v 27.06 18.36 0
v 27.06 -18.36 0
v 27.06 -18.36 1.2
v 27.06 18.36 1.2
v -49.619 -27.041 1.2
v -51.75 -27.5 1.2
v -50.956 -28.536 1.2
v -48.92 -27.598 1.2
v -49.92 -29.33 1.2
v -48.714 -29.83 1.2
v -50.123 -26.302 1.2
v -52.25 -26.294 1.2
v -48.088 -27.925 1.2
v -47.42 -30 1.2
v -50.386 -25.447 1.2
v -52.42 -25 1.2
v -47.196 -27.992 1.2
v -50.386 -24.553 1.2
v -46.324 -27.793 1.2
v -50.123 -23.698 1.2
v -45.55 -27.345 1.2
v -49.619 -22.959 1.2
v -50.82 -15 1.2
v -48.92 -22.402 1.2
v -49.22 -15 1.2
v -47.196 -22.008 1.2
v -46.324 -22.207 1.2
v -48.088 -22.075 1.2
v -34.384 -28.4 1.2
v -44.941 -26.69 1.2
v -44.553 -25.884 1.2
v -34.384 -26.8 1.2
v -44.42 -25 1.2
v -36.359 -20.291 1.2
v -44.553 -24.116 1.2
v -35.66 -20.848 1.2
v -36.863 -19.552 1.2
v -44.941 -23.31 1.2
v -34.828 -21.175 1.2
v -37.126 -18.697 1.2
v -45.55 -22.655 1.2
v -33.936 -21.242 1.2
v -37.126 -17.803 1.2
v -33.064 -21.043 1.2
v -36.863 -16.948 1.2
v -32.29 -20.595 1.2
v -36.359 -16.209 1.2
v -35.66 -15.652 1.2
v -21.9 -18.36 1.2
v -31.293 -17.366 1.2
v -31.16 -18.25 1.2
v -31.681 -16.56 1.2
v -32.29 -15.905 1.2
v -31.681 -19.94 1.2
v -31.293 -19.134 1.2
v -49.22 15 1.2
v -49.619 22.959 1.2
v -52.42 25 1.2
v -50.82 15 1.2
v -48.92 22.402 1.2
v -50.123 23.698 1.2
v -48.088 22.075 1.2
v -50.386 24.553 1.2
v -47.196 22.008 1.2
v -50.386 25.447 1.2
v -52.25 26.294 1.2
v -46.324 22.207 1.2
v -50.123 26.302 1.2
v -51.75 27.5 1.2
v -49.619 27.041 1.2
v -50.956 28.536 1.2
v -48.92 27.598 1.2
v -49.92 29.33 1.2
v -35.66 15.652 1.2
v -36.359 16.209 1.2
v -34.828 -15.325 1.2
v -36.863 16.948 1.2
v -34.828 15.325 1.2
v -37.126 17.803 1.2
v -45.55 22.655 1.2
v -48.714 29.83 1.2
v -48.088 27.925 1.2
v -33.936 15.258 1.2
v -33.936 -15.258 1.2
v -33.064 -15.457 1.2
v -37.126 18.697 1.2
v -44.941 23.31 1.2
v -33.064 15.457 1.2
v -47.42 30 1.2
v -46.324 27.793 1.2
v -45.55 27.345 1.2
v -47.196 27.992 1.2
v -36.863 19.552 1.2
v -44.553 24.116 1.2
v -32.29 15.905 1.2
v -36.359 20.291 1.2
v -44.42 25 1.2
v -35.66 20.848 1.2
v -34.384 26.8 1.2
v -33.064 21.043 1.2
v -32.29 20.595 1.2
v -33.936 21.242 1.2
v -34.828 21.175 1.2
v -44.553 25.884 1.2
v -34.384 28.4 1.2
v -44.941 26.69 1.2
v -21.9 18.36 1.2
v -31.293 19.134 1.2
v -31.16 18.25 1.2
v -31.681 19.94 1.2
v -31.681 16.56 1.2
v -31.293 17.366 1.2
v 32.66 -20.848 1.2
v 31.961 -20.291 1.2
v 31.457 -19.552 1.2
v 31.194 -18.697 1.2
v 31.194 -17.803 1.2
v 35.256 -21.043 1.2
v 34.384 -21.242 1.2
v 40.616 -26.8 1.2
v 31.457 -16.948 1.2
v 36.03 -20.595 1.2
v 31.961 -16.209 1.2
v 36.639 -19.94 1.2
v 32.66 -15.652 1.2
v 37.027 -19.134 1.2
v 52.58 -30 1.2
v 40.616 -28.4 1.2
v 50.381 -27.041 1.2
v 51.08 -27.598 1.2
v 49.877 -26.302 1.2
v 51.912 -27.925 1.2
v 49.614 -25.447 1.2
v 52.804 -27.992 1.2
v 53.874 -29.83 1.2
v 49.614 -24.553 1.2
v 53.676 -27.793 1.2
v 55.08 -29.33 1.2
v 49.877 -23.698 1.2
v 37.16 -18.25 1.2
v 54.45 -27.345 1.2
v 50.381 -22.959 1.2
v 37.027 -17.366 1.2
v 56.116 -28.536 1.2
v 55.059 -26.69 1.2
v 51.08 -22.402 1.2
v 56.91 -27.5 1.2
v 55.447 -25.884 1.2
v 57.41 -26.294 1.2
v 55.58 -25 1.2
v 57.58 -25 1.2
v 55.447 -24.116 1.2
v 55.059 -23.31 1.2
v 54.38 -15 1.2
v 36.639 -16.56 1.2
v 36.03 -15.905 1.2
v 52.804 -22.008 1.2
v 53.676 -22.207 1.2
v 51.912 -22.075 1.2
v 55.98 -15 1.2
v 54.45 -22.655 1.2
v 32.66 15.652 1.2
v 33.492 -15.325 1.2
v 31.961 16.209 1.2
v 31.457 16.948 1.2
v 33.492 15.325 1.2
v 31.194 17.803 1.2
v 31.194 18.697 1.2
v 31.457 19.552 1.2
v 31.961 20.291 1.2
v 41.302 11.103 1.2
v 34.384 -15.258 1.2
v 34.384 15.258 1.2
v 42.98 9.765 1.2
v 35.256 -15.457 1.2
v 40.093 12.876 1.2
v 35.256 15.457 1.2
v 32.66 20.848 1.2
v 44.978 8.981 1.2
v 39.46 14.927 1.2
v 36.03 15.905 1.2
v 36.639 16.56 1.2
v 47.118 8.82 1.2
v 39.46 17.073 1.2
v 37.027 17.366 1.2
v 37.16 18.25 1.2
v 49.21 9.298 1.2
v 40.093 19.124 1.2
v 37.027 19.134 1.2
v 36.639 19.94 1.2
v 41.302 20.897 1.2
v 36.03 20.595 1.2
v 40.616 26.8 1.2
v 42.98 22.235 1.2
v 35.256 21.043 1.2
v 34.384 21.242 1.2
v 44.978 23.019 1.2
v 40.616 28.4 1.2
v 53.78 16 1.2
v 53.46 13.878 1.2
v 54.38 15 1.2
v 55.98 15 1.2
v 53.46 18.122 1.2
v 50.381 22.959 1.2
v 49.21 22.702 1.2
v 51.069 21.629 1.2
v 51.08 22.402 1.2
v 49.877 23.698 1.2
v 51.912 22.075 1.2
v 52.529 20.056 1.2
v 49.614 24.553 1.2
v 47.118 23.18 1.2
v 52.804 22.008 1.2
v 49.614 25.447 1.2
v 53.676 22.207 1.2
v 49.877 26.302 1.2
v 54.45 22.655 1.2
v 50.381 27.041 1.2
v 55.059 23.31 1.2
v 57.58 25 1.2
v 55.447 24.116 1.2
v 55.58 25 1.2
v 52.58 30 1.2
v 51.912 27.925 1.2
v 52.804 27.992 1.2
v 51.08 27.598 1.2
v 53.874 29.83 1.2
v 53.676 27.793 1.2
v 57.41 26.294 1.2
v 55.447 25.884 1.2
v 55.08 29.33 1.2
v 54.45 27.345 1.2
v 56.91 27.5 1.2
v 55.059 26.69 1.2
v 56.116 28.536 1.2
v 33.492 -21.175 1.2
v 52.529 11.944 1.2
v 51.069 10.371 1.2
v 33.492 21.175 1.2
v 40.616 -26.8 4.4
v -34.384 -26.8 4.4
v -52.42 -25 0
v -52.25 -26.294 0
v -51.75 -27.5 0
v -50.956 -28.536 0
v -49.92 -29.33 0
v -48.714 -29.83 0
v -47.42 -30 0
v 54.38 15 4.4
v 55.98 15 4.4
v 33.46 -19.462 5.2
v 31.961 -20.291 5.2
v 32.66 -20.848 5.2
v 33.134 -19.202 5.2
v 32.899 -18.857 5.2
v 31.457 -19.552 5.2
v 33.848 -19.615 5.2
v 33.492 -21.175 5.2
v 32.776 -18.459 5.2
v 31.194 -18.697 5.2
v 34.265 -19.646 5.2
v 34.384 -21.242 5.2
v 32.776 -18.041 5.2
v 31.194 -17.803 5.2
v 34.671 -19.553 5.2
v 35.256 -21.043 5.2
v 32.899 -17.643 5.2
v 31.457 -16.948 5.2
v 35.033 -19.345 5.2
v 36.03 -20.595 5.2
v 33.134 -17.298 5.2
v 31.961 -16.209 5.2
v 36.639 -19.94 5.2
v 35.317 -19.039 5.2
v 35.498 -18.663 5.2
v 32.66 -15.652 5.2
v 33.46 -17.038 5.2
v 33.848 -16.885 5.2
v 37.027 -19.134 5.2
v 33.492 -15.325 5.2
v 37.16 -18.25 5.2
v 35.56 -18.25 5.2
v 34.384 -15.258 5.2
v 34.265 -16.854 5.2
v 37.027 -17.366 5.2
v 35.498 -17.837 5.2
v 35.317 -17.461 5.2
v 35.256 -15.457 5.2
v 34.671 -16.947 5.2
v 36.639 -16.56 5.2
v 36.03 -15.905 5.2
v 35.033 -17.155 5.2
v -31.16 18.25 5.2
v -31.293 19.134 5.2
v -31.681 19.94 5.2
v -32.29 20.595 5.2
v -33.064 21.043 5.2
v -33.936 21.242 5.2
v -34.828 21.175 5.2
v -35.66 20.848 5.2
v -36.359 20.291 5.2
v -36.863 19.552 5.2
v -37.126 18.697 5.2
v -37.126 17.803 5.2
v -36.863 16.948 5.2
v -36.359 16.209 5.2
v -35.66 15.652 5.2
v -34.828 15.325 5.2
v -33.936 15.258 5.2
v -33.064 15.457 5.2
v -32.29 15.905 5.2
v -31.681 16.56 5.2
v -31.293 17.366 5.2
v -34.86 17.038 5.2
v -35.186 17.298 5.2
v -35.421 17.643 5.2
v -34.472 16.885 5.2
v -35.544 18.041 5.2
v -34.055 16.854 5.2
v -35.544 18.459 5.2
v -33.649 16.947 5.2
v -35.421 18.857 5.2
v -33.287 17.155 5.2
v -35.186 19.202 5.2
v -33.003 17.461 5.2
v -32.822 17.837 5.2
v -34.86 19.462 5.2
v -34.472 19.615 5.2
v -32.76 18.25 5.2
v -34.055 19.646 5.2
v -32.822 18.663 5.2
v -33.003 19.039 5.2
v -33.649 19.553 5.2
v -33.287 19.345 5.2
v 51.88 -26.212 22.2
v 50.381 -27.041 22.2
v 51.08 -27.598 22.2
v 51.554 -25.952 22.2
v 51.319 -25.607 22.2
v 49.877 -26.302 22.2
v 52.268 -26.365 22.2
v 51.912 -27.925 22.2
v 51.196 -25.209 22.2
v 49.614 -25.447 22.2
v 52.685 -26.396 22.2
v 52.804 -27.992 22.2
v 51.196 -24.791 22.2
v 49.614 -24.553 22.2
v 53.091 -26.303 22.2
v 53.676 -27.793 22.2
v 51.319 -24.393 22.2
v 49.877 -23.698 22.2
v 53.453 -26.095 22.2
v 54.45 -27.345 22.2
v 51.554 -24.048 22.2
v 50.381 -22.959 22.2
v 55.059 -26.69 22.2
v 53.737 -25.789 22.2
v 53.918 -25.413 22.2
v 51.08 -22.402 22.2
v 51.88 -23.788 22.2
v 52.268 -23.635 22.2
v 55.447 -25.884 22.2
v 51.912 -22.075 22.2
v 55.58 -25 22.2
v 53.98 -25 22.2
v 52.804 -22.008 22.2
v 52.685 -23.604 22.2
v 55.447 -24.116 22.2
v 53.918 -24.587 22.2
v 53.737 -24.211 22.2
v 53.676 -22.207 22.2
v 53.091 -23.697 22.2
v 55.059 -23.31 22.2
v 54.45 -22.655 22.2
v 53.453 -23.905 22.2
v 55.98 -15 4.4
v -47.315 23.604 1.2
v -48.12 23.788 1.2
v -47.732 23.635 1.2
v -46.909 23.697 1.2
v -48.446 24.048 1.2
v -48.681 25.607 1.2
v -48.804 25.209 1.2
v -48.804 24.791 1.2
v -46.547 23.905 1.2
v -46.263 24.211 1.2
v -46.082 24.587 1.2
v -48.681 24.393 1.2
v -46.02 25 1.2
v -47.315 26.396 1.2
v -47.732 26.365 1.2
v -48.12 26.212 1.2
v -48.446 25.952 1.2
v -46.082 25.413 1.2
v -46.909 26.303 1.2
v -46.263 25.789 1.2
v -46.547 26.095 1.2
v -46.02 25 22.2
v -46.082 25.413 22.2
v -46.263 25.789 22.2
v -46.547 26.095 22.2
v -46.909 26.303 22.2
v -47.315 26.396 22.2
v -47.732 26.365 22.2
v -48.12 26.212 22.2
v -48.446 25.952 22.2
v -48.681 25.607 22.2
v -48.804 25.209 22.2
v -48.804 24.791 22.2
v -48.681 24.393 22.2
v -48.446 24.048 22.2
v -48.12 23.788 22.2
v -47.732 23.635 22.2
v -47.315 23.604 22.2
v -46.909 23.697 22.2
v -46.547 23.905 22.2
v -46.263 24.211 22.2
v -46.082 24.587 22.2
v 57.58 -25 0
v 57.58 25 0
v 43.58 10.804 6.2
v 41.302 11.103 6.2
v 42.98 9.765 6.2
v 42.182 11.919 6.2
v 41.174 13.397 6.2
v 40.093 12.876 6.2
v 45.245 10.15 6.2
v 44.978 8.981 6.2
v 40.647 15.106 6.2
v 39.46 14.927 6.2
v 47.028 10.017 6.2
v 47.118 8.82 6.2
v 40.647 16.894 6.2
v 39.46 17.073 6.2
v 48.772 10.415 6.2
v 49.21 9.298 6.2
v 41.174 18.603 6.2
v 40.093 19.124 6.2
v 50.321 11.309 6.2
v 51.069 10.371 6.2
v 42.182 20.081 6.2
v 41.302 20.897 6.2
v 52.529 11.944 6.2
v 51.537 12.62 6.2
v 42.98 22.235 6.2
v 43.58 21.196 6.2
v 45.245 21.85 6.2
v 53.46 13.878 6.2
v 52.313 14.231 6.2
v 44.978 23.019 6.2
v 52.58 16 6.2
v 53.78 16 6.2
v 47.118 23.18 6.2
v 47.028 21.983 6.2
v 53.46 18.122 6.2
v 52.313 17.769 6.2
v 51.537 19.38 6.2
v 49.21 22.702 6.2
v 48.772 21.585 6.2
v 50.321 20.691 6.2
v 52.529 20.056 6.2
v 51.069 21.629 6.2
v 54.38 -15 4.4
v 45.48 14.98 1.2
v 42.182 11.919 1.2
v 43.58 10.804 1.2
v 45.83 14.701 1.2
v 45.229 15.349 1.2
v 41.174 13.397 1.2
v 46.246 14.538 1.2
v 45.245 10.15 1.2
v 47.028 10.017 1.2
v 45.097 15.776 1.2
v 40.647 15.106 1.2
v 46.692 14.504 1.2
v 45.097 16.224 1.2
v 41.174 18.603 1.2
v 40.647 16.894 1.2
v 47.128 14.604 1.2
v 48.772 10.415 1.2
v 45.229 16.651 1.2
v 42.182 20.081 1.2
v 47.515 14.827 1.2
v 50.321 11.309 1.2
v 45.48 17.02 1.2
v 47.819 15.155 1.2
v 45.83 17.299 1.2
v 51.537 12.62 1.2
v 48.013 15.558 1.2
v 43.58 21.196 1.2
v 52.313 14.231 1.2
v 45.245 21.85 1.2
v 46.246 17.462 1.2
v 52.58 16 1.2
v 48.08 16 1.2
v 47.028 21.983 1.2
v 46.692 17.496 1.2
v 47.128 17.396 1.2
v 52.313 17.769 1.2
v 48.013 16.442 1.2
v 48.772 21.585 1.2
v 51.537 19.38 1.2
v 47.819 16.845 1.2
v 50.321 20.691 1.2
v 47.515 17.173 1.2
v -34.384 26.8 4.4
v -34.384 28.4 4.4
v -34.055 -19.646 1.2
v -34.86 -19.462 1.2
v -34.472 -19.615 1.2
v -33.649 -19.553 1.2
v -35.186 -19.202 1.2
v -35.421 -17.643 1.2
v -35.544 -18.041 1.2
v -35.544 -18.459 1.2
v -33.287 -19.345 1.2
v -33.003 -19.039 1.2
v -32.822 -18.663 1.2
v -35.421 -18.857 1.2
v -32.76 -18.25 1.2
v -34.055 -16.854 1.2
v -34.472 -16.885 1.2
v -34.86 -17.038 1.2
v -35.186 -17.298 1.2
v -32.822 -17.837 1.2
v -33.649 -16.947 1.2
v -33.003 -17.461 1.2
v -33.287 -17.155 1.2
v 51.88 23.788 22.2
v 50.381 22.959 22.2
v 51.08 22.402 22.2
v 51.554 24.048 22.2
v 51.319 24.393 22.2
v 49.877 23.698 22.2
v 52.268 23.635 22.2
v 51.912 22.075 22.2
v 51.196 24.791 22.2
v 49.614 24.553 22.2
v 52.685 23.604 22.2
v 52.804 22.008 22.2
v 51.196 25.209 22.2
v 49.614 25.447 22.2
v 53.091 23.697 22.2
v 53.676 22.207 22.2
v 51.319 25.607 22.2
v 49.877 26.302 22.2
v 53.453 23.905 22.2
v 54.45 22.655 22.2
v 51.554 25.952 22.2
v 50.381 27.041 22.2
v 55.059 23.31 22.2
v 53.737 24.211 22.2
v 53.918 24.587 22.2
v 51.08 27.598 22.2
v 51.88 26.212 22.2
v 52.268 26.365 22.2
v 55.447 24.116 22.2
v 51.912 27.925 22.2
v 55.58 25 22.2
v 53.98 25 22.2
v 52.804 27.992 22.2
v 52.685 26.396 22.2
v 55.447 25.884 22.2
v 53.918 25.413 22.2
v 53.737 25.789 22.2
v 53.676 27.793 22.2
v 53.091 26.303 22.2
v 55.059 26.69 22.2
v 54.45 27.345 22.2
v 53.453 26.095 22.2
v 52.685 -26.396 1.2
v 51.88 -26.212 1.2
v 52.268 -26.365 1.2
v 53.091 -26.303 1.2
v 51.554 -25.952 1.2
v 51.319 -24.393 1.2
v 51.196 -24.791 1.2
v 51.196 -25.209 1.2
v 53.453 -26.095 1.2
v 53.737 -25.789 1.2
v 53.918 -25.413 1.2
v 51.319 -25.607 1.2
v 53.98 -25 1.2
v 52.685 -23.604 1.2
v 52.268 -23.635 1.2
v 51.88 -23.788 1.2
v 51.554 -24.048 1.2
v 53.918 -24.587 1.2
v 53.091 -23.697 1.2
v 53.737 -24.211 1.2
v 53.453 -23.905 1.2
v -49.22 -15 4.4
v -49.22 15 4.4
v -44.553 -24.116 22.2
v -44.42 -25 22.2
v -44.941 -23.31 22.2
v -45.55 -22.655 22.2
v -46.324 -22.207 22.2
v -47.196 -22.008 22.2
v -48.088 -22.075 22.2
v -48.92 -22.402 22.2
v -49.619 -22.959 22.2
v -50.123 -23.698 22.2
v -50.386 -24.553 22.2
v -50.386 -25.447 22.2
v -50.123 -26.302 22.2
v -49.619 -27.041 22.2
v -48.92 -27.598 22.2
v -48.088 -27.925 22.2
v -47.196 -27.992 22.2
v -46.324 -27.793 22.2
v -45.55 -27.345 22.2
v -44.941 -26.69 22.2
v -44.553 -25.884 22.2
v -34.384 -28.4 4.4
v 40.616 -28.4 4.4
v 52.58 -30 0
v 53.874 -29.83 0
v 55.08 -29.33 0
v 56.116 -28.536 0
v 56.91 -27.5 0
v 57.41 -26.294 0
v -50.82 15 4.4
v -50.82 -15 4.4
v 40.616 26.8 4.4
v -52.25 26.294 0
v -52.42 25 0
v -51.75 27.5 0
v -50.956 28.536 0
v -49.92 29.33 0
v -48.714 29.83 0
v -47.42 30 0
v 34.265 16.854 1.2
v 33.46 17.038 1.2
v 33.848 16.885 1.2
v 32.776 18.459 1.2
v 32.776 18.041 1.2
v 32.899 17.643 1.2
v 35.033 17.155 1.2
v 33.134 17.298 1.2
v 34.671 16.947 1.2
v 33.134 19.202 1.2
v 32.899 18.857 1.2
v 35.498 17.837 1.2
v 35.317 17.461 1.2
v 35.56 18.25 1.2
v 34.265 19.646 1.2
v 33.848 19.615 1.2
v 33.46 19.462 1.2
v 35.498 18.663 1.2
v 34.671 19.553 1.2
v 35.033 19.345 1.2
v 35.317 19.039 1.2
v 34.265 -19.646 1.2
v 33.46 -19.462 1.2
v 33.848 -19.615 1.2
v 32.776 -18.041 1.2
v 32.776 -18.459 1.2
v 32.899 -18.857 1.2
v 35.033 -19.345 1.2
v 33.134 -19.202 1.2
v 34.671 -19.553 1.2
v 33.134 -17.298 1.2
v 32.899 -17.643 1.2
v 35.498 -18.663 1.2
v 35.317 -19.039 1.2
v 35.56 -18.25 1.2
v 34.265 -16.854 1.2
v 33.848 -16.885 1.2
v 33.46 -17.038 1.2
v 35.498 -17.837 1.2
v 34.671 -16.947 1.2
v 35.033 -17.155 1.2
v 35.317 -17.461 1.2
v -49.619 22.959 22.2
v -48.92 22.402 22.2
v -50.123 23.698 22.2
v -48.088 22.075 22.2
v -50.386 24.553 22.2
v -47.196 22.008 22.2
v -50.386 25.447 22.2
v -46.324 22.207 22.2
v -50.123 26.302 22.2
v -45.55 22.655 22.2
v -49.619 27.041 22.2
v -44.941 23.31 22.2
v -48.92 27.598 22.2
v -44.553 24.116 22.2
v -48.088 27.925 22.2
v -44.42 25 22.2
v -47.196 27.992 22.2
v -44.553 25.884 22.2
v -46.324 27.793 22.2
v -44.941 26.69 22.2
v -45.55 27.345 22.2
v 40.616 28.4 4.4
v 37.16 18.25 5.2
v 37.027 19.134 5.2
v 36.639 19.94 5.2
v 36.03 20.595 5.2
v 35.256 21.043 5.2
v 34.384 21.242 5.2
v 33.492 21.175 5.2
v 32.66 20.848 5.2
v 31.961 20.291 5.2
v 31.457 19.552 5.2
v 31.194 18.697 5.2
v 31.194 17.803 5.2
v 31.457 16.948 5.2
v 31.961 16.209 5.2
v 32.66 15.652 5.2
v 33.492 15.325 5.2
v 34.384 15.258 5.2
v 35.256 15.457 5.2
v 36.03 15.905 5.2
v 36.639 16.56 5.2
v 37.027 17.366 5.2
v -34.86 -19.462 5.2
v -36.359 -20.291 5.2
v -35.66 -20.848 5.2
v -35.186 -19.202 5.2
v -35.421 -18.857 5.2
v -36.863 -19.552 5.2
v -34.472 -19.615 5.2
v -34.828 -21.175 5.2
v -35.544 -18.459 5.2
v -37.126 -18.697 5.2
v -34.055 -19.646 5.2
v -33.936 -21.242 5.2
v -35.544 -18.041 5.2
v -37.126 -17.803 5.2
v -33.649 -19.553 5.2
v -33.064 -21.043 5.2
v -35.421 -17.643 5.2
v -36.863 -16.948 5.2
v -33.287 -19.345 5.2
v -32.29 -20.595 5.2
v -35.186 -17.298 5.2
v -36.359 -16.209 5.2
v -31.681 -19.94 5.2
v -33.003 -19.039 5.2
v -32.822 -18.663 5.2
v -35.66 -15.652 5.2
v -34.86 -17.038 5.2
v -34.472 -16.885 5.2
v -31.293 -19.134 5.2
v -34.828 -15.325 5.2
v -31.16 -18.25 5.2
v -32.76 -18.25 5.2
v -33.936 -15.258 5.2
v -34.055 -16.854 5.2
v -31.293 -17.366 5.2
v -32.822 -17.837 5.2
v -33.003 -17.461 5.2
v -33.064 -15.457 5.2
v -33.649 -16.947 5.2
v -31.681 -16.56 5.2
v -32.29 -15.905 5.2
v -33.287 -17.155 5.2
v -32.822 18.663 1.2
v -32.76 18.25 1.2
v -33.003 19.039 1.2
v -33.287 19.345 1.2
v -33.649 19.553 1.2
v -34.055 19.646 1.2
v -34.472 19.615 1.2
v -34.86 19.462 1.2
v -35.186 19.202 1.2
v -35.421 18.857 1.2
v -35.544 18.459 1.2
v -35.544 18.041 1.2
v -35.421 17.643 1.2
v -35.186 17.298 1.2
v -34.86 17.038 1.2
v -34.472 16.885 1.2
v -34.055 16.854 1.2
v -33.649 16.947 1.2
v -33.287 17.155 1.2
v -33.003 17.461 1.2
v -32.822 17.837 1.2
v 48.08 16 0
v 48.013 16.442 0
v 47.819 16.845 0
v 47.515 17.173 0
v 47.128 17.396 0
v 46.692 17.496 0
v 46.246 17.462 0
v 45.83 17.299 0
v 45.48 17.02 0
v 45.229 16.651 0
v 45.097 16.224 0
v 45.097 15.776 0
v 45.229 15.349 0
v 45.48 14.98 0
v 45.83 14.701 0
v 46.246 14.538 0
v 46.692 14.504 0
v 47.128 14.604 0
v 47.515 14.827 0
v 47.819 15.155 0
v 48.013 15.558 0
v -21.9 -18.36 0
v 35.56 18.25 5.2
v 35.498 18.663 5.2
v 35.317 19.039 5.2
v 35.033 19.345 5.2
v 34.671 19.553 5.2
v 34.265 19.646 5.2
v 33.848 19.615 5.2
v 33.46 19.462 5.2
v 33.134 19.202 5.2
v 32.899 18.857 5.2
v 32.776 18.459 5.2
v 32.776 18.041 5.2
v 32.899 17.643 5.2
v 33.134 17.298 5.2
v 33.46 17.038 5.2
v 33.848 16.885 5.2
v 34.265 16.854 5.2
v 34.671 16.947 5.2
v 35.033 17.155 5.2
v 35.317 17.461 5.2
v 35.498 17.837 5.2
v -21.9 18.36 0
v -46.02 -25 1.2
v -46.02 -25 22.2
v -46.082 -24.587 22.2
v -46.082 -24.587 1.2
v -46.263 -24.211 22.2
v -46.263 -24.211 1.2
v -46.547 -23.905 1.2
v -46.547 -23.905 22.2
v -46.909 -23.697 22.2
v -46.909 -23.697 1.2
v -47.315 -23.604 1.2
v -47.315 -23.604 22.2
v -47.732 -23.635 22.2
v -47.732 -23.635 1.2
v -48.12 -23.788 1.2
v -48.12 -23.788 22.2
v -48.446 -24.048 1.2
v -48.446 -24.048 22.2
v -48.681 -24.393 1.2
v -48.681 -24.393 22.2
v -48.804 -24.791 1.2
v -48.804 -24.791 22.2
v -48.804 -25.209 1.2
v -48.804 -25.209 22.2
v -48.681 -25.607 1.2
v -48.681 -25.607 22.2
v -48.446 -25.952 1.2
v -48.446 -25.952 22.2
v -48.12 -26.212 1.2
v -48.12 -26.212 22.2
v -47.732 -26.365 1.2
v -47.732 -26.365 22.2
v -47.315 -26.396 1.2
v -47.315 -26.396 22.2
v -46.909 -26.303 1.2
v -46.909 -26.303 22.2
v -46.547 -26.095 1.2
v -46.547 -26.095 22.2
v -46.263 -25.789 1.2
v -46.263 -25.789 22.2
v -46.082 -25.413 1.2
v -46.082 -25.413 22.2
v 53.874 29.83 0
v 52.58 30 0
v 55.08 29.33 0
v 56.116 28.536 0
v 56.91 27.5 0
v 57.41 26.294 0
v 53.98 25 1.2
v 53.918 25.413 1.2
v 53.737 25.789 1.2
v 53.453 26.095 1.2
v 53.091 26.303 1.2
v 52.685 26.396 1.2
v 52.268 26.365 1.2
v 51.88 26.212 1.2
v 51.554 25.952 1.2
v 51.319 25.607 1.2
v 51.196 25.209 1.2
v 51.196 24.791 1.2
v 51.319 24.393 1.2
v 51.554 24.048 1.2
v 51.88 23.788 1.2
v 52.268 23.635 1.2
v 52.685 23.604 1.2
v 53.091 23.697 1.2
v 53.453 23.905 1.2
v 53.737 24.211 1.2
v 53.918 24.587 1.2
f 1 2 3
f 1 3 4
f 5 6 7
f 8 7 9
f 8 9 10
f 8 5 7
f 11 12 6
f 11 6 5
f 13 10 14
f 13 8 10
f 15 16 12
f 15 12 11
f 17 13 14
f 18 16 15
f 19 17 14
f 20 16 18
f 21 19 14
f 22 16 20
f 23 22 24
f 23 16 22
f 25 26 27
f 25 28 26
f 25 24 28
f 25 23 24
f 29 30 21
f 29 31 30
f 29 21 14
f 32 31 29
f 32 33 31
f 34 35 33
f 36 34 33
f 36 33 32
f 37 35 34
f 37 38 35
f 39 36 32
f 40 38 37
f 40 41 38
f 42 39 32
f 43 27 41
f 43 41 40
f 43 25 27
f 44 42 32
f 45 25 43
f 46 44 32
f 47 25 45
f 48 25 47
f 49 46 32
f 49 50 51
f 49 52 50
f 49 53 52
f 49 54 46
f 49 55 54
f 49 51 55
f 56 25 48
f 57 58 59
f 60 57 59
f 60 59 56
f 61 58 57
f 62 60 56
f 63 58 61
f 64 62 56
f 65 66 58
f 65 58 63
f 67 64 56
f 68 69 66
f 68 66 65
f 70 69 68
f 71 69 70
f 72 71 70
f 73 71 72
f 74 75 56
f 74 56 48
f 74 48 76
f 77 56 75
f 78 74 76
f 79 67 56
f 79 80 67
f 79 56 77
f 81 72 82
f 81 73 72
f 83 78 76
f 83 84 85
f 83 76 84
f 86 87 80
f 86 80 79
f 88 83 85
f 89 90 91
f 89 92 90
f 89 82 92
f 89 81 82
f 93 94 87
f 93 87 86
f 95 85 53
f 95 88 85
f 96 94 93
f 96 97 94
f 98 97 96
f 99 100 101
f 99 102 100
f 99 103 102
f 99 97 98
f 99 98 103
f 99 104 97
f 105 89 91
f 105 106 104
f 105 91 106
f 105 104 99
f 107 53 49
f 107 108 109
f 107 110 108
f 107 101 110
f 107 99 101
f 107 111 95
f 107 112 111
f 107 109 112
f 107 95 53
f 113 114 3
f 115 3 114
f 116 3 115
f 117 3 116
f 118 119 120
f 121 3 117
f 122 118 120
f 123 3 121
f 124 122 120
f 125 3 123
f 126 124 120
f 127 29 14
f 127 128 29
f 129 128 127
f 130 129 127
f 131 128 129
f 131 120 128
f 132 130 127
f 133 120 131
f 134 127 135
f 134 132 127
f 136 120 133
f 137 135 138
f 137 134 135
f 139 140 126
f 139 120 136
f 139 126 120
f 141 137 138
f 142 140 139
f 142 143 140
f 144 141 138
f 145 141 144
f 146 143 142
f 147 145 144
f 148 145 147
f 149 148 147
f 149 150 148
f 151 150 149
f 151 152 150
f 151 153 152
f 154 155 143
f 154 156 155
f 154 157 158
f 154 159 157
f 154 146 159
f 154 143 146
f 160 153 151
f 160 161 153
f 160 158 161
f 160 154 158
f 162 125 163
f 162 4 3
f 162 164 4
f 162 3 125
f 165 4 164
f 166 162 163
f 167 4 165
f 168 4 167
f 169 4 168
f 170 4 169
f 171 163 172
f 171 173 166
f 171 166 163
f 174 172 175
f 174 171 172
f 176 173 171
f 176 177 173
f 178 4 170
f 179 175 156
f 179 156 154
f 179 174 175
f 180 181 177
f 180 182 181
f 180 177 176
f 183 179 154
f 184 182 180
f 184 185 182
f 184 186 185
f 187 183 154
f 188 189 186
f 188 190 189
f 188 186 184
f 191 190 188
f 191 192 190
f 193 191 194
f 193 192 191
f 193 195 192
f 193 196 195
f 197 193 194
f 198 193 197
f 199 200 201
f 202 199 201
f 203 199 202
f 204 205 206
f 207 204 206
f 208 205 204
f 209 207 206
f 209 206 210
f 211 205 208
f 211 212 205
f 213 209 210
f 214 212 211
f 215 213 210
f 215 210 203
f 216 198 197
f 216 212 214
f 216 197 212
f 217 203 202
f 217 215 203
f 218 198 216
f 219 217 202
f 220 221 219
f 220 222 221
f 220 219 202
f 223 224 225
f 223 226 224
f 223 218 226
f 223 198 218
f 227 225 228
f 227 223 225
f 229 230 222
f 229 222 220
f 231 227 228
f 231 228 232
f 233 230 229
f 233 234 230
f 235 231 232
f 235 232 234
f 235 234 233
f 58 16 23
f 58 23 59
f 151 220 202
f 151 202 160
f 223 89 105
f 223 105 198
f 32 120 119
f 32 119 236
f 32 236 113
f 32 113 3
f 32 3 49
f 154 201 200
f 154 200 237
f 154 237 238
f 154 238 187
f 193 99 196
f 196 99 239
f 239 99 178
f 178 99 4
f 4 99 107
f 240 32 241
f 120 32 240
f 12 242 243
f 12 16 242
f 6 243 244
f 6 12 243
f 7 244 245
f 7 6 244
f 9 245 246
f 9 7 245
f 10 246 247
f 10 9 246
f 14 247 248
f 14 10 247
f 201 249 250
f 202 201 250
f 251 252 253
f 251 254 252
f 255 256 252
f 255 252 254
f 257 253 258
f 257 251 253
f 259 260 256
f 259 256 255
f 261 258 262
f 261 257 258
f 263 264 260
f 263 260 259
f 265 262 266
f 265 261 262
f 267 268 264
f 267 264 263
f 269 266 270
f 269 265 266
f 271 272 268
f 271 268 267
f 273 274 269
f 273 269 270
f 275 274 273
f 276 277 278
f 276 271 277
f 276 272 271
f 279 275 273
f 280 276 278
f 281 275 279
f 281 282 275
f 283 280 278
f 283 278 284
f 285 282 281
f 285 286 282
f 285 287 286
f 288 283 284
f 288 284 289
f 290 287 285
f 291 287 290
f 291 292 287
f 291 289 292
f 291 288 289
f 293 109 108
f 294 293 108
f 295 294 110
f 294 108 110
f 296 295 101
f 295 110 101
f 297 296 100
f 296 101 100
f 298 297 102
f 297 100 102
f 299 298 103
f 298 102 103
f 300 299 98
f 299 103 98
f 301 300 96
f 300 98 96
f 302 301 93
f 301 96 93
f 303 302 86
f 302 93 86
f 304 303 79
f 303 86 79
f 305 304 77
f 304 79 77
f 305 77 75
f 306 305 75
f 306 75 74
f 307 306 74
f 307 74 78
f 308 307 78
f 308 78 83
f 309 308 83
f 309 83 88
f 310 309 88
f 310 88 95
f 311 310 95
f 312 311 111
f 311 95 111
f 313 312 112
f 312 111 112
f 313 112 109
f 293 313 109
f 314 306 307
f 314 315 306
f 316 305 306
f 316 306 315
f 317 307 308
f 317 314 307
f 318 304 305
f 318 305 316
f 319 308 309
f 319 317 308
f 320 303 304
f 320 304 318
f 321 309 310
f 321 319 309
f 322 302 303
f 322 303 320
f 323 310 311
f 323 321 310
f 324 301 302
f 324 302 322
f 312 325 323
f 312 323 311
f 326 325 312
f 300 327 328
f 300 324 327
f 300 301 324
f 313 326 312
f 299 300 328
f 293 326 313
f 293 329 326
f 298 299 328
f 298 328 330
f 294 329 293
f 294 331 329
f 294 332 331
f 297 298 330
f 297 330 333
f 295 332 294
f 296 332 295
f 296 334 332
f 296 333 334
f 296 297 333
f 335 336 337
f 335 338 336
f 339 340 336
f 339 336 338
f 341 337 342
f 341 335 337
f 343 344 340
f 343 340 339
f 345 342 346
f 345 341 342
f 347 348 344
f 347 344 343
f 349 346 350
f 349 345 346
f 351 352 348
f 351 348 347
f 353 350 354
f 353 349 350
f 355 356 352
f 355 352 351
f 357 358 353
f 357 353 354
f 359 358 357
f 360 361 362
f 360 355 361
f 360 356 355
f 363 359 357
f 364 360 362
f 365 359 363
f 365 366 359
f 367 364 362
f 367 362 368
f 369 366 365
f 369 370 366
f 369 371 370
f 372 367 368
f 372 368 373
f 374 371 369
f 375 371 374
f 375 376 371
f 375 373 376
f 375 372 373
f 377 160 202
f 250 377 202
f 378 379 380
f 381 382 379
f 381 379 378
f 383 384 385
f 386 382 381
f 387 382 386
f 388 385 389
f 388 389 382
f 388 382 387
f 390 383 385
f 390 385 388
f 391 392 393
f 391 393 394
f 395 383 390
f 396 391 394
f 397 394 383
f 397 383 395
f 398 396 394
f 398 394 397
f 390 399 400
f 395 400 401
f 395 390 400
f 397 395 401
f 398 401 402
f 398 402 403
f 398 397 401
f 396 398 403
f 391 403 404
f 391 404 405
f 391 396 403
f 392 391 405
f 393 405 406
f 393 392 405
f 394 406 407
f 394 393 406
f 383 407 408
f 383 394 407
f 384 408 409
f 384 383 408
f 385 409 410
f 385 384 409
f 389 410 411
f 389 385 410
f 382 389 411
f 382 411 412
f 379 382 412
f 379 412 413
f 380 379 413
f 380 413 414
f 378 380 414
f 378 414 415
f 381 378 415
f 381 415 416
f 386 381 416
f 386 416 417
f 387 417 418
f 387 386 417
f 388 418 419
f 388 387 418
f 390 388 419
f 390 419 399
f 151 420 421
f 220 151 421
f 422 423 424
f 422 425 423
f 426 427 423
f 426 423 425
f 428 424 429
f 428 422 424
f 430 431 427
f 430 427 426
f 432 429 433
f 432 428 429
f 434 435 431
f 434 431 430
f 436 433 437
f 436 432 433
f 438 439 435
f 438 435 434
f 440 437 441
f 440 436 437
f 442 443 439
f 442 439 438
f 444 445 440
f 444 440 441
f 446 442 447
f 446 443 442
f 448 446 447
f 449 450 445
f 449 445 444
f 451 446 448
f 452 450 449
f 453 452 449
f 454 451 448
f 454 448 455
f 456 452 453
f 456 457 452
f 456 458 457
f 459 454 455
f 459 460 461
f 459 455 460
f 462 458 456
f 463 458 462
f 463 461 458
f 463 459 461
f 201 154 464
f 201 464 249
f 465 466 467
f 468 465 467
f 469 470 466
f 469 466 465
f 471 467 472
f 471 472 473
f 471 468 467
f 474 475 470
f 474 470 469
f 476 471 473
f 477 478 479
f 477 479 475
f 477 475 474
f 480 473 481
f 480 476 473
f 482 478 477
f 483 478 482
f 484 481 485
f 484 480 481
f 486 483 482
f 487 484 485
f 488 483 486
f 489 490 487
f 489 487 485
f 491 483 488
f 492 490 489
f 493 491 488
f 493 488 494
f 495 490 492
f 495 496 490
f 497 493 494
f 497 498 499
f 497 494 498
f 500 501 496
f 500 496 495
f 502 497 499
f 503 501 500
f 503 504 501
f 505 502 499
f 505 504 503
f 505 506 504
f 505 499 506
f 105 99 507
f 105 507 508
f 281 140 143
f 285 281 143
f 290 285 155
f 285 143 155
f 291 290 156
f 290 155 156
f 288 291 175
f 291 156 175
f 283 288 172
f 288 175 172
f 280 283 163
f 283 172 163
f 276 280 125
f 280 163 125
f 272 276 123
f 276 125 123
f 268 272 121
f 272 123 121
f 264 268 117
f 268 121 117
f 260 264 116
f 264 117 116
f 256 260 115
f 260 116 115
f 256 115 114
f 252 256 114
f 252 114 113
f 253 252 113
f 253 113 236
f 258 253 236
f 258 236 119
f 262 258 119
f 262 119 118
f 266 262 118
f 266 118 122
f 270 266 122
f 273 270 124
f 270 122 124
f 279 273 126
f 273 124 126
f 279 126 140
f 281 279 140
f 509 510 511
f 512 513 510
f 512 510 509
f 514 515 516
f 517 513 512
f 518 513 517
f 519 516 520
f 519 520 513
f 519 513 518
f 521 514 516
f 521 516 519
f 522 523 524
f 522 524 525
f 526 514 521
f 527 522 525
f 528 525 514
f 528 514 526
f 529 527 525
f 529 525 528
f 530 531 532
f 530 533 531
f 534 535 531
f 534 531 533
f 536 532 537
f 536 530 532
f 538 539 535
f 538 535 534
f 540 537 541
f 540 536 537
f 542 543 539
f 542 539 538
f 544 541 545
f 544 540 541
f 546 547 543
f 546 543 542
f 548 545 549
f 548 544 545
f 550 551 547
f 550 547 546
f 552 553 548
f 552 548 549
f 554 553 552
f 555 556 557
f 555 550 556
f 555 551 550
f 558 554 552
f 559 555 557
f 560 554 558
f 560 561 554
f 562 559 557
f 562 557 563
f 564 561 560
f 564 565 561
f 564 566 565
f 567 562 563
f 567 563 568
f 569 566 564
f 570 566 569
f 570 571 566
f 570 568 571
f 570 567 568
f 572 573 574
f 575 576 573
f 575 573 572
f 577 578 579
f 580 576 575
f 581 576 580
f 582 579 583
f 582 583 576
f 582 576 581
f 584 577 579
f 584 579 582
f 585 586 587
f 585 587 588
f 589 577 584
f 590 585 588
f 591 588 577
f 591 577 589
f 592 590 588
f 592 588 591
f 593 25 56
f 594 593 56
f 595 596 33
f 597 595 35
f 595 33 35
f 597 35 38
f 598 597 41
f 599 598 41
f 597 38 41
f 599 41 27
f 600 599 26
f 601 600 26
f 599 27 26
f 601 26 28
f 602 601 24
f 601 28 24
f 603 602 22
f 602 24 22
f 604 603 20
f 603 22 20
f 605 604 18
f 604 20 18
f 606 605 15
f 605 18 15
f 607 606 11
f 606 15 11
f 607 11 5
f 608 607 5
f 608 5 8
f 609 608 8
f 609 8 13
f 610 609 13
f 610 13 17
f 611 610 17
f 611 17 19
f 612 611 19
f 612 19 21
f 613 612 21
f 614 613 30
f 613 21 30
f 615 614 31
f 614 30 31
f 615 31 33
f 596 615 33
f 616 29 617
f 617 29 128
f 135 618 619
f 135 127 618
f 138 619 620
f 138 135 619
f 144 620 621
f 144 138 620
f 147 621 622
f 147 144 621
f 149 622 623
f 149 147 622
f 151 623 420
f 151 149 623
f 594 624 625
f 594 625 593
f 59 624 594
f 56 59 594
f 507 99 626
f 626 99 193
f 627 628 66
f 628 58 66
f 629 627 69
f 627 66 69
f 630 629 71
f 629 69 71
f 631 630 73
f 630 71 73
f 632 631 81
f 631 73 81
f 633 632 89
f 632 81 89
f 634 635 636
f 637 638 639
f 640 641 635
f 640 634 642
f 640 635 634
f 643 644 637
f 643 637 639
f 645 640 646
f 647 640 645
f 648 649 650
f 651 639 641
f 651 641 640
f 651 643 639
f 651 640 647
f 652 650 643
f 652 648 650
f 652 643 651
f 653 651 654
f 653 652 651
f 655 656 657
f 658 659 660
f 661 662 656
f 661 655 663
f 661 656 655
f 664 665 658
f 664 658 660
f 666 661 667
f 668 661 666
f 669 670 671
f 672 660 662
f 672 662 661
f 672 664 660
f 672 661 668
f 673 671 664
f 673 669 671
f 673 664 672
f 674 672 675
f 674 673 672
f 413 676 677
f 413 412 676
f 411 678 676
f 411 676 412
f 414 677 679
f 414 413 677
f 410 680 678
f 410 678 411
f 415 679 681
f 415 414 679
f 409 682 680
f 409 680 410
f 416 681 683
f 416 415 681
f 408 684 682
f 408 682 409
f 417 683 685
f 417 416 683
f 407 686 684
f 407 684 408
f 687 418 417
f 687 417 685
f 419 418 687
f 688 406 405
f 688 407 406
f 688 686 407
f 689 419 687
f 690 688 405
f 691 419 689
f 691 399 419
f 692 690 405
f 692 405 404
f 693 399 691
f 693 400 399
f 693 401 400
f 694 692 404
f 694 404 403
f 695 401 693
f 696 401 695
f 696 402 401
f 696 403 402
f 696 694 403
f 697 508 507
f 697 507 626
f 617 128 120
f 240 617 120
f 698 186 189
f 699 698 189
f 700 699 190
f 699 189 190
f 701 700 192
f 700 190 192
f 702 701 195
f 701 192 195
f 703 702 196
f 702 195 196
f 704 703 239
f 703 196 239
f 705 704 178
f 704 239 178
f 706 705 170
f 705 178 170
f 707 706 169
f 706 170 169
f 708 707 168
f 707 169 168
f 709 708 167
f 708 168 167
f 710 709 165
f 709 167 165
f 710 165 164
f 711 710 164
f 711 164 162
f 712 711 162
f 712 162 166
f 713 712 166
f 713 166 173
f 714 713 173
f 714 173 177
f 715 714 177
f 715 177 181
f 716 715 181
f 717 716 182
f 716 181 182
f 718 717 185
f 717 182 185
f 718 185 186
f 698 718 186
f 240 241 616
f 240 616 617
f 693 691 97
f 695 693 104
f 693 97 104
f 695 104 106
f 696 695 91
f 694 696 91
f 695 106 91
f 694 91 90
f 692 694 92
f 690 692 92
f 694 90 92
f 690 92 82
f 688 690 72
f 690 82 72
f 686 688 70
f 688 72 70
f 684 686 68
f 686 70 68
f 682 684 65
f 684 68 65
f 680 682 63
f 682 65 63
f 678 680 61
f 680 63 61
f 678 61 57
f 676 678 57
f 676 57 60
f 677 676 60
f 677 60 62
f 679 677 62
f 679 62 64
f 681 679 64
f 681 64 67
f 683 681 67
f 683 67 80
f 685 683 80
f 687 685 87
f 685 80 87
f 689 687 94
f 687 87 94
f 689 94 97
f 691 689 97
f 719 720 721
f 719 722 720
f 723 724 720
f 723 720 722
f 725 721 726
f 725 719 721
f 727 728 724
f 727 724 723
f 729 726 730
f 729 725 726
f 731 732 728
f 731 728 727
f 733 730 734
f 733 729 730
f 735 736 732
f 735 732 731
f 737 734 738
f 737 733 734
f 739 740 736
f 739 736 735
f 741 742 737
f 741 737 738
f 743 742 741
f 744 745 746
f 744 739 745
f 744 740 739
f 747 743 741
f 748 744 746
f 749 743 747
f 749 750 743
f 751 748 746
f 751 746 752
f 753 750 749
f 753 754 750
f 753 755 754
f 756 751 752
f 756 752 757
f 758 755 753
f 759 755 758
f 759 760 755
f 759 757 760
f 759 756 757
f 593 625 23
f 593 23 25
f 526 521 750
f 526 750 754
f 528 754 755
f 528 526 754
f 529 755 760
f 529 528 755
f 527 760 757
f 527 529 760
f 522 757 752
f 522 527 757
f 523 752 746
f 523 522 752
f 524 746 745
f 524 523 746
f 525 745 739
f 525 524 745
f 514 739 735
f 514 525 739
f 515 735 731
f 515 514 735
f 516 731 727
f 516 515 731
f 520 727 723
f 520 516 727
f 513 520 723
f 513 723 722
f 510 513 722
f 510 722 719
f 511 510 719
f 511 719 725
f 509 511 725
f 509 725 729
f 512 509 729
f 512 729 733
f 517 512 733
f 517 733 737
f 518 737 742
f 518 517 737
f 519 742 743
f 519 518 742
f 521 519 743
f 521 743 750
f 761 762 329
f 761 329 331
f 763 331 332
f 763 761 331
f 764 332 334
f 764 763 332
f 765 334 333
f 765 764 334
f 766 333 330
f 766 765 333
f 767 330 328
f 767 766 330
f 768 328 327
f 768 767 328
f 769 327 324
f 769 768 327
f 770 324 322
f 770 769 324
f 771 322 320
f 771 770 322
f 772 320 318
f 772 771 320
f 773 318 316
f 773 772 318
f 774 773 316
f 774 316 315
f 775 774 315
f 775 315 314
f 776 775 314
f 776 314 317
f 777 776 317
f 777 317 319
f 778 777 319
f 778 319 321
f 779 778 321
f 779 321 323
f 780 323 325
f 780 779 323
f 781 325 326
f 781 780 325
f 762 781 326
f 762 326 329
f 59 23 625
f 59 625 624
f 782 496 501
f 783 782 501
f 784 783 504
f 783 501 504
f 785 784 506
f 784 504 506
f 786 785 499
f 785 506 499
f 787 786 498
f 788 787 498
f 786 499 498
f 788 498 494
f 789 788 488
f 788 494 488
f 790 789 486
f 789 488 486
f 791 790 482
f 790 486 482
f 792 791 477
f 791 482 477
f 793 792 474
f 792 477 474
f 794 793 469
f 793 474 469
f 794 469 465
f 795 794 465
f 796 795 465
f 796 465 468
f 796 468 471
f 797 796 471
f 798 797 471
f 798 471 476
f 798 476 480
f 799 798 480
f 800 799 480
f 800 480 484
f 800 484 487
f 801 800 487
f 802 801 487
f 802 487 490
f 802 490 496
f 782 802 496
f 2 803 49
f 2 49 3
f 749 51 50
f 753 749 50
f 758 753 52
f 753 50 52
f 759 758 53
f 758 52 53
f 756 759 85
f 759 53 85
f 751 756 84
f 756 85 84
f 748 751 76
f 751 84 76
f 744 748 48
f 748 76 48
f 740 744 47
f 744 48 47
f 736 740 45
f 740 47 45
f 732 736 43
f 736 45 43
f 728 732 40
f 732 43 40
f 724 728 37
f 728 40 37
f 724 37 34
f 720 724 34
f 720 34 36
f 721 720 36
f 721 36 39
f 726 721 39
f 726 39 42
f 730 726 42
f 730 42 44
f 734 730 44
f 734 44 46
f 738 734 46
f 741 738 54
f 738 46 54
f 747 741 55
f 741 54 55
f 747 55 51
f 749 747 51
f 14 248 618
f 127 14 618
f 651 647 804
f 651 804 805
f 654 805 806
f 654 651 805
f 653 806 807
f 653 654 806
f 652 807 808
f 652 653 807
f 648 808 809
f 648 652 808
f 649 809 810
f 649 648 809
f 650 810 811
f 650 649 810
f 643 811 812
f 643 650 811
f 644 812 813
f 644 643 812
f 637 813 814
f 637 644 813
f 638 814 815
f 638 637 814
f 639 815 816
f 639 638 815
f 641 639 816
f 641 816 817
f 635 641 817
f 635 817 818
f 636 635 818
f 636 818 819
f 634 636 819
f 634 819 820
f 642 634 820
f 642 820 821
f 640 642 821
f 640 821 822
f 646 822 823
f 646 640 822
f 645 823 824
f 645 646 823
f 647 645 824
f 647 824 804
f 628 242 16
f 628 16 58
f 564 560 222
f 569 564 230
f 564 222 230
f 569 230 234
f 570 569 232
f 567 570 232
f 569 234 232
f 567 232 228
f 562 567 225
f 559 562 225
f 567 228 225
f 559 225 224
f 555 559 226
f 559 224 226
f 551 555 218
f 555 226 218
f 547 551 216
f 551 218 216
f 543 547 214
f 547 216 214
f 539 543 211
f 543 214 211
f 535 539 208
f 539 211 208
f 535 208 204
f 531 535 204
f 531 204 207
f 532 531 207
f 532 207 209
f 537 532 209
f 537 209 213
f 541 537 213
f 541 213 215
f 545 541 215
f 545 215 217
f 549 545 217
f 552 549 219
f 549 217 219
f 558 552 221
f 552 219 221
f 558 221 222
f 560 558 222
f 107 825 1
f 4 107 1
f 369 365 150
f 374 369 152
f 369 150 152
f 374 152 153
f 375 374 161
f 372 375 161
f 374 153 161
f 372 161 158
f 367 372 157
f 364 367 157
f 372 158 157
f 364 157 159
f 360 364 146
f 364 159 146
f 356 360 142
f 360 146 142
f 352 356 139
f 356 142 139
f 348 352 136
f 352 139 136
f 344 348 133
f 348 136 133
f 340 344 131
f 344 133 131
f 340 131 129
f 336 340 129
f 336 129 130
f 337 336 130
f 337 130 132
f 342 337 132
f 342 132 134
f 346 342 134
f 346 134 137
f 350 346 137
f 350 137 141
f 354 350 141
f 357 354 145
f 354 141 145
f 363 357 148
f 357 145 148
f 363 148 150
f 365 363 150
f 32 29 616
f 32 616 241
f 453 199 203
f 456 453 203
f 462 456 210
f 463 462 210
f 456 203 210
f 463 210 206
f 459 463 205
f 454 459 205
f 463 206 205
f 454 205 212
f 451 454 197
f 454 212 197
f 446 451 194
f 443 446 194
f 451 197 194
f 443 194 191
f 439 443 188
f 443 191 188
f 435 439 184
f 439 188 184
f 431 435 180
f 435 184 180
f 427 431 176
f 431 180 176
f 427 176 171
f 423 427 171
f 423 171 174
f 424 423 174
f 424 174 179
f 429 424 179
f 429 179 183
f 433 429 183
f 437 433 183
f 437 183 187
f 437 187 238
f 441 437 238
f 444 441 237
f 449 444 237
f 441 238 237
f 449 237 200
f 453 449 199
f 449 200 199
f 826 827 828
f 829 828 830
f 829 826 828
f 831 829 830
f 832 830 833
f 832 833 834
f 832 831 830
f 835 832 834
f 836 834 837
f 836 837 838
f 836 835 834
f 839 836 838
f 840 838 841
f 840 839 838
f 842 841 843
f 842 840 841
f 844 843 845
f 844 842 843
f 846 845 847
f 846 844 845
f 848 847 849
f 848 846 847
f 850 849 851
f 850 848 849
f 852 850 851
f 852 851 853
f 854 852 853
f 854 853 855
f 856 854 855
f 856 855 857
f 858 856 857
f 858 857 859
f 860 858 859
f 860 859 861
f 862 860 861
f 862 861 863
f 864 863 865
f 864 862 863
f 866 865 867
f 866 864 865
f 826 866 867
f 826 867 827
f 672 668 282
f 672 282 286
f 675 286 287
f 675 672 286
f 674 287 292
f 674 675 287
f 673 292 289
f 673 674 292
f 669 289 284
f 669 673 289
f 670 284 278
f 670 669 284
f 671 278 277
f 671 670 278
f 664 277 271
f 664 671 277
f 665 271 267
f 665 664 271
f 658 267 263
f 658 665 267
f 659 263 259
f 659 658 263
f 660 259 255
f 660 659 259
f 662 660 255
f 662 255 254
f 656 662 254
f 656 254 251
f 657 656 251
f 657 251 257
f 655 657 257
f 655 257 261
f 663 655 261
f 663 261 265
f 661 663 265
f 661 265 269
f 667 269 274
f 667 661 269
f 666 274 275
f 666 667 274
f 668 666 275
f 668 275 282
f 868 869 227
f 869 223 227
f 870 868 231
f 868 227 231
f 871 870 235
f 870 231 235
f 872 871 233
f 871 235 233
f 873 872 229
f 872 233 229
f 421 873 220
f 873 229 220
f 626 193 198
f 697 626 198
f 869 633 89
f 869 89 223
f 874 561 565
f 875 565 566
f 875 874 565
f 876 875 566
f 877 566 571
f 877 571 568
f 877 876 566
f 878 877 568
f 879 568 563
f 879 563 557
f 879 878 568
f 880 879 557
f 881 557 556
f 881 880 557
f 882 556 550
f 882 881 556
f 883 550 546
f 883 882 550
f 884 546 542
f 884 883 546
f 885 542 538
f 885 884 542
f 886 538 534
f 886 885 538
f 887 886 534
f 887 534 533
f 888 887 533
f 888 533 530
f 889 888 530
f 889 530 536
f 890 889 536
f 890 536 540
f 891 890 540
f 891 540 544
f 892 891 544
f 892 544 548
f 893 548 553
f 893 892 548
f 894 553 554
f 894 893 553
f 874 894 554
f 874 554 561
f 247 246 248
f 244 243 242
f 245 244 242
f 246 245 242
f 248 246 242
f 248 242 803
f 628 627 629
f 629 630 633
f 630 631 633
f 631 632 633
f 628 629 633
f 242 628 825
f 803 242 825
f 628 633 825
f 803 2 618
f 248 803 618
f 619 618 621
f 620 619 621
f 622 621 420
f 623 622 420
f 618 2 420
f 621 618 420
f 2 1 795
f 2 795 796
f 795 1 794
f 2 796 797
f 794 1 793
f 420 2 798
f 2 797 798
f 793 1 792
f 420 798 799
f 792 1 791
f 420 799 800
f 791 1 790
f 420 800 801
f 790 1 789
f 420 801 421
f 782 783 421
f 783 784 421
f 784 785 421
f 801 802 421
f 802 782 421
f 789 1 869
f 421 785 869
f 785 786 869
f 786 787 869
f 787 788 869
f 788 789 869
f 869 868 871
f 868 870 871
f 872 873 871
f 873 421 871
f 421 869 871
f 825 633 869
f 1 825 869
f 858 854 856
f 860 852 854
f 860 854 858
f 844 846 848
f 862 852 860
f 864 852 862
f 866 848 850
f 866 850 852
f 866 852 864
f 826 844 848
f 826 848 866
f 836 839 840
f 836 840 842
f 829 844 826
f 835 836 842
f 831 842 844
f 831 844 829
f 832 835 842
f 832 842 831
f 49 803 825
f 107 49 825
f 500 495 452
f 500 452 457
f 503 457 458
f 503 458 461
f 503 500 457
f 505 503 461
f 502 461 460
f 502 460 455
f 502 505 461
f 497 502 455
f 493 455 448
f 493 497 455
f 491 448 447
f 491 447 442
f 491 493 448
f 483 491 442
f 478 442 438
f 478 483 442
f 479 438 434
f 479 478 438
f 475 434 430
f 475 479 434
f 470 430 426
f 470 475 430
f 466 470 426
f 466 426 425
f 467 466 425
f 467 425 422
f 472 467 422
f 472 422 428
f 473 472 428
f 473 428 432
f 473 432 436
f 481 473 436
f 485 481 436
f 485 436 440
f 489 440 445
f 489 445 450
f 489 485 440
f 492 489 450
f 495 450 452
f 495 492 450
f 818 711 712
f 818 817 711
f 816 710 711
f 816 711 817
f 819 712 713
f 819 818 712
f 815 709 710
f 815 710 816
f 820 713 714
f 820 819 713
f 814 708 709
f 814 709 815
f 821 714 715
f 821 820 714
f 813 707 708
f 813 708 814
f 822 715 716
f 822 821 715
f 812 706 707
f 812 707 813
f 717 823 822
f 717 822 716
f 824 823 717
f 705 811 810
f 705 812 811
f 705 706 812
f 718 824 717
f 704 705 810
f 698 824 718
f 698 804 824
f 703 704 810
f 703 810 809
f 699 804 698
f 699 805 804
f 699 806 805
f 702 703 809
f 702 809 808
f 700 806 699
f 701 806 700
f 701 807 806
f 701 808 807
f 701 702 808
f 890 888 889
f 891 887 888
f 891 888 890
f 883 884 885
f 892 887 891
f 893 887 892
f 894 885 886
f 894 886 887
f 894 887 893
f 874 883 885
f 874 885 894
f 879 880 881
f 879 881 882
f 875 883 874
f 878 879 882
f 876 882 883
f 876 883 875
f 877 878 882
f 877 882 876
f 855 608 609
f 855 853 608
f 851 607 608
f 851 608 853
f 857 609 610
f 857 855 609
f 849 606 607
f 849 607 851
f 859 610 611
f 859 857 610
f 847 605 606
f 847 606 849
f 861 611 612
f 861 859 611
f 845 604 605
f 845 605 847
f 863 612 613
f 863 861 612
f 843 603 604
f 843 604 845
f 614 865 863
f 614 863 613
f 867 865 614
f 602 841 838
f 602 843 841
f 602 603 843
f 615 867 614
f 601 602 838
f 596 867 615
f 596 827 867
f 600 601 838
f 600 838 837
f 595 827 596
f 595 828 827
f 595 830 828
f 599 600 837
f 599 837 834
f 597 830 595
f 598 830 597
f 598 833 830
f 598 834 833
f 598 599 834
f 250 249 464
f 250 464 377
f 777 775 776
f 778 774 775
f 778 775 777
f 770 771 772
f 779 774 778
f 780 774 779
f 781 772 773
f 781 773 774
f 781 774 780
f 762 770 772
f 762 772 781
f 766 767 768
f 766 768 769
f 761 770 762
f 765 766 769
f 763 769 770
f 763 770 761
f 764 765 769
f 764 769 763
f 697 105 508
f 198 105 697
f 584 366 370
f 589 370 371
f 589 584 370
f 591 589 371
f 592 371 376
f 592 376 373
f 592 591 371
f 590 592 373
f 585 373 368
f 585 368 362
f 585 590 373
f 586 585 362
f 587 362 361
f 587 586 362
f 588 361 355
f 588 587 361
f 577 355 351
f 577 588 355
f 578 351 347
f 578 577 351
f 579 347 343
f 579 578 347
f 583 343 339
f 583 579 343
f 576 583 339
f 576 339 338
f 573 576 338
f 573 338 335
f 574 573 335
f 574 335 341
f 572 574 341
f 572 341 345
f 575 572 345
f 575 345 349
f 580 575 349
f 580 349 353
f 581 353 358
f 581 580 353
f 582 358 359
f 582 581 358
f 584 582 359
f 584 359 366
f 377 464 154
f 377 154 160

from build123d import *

# Parameters (mm, degrees)
F0_W      = 110
F0_H      = 60
F0_W_2    = 48.96
F0_H_2    = 36.72
F1_DEPTH  = 1.2
F2_R      = 7.2
F2_R_2    = 6
F3_DEPTH  = 5
F4_DEPTH  = 5
F5_R      = 1.5
F6_DEPTH  = 25
F7_R      = 5
F8_R      = 3
F8_R_2    = 1.4
F9_DEPTH  = 21
F10_R     = 3
F10_R_2   = 1.4
F11_DEPTH = 4
F12_W     = 75
F12_H     = 1.6
F12_W_2   = 1.6
F12_H_2   = 30
F13_DEPTH = 3.2


with BuildPart() as f1:
    # F0 (on Top) → F1 (new body)
    with BuildSketch(Plane.XY):
        with Locations((2.58, 0)):
            Rectangle(F0_W, F0_H)
        with Locations((2.58, 0)):
            Rectangle(F0_W_2, F0_H_2, mode=Mode.SUBTRACT)
    extrude(amount=F1_DEPTH)

    # F2 (on face) → F3 (join)
    with BuildSketch(Plane.XY.offset(1.2)):
        with Locations((46.58, 16)):
            Circle(F2_R)
        with Locations((46.58, 16)):
            Circle(F2_R_2, mode=Mode.SUBTRACT)
    extrude(amount=F3_DEPTH)

    # F2 (on face) → F4 (join)
    with BuildSketch(Plane.XY.offset(1.2)):
        with Locations((46.58, 16)):
            Circle(F2_R)
        with Locations((46.58, 16)):
            Circle(F2_R_2, mode=Mode.SUBTRACT)
    extrude(amount=F4_DEPTH)

    # F5 (on face) → F6 (cut)
    with BuildSketch(Plane.XY.offset(1.2)):
        with Locations((46.58, 16)):
            Circle(F5_R)
    extrude(amount=-F6_DEPTH, mode=Mode.SUBTRACT)

    # F7
    f7_edges = [f1.edges().sort_by_distance(p)[0] for p in [
        (57.58, 30, 0.6),
        (-52.42, 30, 0.6),
        (-52.42, -30, 0.6),
        (57.58, -30, 0.6),
    ]]
    fillet(f7_edges, radius=F7_R)

    # F8 (on face) → F9 (join)
    with BuildSketch(Plane.XY.offset(1.2)):
        with Locations((52.58, 25)):
            Circle(F8_R)
        with Locations((52.58, 25)):
            Circle(F8_R_2, mode=Mode.SUBTRACT)
        with Locations((52.58, -25)):
            Circle(F8_R)
        with Locations((52.58, -25)):
            Circle(F8_R_2, mode=Mode.SUBTRACT)
        with Locations((-47.42, -25)):
            Circle(F8_R)
        with Locations((-47.42, -25)):
            Circle(F8_R_2, mode=Mode.SUBTRACT)
        with Locations((-47.42, 25)):
            Circle(F8_R)
        with Locations((-47.42, 25)):
            Circle(F8_R_2, mode=Mode.SUBTRACT)
    extrude(amount=F9_DEPTH)

    # F10 (on face) → F11 (join)
    with BuildSketch(Plane.XY.offset(1.2)):
        with Locations((34.16, -18.25)):
            Circle(F10_R)
        with Locations((34.16, -18.25)):
            Circle(F10_R_2, mode=Mode.SUBTRACT)
        with Locations((-34.16, -18.25)):
            Circle(F10_R)
        with Locations((-34.16, -18.25)):
            Circle(F10_R_2, mode=Mode.SUBTRACT)
        with Locations((34.16, 18.25)):
            Circle(F10_R)
        with Locations((34.16, 18.25)):
            Circle(F10_R_2, mode=Mode.SUBTRACT)
        with Locations((-34.16, 18.25)):
            Circle(F10_R)
        with Locations((-34.16, 18.25)):
            Circle(F10_R_2, mode=Mode.SUBTRACT)
    extrude(amount=F11_DEPTH)

    # F12 (on face) → F13 (join)
    with BuildSketch(Plane.XY.offset(1.2)):
        with Locations((3.115936, -27.6)):
            Rectangle(F12_W, F12_H)
        with Locations((3.115936, 27.6)):
            Rectangle(F12_W, F12_H)
        with Locations((-50.02, 0)):
            Rectangle(F12_W_2, F12_H_2)
        with Locations((55.18, 0)):
            Rectangle(F12_W_2, F12_H_2)
    extrude(amount=F13_DEPTH)


solid = f1.part
